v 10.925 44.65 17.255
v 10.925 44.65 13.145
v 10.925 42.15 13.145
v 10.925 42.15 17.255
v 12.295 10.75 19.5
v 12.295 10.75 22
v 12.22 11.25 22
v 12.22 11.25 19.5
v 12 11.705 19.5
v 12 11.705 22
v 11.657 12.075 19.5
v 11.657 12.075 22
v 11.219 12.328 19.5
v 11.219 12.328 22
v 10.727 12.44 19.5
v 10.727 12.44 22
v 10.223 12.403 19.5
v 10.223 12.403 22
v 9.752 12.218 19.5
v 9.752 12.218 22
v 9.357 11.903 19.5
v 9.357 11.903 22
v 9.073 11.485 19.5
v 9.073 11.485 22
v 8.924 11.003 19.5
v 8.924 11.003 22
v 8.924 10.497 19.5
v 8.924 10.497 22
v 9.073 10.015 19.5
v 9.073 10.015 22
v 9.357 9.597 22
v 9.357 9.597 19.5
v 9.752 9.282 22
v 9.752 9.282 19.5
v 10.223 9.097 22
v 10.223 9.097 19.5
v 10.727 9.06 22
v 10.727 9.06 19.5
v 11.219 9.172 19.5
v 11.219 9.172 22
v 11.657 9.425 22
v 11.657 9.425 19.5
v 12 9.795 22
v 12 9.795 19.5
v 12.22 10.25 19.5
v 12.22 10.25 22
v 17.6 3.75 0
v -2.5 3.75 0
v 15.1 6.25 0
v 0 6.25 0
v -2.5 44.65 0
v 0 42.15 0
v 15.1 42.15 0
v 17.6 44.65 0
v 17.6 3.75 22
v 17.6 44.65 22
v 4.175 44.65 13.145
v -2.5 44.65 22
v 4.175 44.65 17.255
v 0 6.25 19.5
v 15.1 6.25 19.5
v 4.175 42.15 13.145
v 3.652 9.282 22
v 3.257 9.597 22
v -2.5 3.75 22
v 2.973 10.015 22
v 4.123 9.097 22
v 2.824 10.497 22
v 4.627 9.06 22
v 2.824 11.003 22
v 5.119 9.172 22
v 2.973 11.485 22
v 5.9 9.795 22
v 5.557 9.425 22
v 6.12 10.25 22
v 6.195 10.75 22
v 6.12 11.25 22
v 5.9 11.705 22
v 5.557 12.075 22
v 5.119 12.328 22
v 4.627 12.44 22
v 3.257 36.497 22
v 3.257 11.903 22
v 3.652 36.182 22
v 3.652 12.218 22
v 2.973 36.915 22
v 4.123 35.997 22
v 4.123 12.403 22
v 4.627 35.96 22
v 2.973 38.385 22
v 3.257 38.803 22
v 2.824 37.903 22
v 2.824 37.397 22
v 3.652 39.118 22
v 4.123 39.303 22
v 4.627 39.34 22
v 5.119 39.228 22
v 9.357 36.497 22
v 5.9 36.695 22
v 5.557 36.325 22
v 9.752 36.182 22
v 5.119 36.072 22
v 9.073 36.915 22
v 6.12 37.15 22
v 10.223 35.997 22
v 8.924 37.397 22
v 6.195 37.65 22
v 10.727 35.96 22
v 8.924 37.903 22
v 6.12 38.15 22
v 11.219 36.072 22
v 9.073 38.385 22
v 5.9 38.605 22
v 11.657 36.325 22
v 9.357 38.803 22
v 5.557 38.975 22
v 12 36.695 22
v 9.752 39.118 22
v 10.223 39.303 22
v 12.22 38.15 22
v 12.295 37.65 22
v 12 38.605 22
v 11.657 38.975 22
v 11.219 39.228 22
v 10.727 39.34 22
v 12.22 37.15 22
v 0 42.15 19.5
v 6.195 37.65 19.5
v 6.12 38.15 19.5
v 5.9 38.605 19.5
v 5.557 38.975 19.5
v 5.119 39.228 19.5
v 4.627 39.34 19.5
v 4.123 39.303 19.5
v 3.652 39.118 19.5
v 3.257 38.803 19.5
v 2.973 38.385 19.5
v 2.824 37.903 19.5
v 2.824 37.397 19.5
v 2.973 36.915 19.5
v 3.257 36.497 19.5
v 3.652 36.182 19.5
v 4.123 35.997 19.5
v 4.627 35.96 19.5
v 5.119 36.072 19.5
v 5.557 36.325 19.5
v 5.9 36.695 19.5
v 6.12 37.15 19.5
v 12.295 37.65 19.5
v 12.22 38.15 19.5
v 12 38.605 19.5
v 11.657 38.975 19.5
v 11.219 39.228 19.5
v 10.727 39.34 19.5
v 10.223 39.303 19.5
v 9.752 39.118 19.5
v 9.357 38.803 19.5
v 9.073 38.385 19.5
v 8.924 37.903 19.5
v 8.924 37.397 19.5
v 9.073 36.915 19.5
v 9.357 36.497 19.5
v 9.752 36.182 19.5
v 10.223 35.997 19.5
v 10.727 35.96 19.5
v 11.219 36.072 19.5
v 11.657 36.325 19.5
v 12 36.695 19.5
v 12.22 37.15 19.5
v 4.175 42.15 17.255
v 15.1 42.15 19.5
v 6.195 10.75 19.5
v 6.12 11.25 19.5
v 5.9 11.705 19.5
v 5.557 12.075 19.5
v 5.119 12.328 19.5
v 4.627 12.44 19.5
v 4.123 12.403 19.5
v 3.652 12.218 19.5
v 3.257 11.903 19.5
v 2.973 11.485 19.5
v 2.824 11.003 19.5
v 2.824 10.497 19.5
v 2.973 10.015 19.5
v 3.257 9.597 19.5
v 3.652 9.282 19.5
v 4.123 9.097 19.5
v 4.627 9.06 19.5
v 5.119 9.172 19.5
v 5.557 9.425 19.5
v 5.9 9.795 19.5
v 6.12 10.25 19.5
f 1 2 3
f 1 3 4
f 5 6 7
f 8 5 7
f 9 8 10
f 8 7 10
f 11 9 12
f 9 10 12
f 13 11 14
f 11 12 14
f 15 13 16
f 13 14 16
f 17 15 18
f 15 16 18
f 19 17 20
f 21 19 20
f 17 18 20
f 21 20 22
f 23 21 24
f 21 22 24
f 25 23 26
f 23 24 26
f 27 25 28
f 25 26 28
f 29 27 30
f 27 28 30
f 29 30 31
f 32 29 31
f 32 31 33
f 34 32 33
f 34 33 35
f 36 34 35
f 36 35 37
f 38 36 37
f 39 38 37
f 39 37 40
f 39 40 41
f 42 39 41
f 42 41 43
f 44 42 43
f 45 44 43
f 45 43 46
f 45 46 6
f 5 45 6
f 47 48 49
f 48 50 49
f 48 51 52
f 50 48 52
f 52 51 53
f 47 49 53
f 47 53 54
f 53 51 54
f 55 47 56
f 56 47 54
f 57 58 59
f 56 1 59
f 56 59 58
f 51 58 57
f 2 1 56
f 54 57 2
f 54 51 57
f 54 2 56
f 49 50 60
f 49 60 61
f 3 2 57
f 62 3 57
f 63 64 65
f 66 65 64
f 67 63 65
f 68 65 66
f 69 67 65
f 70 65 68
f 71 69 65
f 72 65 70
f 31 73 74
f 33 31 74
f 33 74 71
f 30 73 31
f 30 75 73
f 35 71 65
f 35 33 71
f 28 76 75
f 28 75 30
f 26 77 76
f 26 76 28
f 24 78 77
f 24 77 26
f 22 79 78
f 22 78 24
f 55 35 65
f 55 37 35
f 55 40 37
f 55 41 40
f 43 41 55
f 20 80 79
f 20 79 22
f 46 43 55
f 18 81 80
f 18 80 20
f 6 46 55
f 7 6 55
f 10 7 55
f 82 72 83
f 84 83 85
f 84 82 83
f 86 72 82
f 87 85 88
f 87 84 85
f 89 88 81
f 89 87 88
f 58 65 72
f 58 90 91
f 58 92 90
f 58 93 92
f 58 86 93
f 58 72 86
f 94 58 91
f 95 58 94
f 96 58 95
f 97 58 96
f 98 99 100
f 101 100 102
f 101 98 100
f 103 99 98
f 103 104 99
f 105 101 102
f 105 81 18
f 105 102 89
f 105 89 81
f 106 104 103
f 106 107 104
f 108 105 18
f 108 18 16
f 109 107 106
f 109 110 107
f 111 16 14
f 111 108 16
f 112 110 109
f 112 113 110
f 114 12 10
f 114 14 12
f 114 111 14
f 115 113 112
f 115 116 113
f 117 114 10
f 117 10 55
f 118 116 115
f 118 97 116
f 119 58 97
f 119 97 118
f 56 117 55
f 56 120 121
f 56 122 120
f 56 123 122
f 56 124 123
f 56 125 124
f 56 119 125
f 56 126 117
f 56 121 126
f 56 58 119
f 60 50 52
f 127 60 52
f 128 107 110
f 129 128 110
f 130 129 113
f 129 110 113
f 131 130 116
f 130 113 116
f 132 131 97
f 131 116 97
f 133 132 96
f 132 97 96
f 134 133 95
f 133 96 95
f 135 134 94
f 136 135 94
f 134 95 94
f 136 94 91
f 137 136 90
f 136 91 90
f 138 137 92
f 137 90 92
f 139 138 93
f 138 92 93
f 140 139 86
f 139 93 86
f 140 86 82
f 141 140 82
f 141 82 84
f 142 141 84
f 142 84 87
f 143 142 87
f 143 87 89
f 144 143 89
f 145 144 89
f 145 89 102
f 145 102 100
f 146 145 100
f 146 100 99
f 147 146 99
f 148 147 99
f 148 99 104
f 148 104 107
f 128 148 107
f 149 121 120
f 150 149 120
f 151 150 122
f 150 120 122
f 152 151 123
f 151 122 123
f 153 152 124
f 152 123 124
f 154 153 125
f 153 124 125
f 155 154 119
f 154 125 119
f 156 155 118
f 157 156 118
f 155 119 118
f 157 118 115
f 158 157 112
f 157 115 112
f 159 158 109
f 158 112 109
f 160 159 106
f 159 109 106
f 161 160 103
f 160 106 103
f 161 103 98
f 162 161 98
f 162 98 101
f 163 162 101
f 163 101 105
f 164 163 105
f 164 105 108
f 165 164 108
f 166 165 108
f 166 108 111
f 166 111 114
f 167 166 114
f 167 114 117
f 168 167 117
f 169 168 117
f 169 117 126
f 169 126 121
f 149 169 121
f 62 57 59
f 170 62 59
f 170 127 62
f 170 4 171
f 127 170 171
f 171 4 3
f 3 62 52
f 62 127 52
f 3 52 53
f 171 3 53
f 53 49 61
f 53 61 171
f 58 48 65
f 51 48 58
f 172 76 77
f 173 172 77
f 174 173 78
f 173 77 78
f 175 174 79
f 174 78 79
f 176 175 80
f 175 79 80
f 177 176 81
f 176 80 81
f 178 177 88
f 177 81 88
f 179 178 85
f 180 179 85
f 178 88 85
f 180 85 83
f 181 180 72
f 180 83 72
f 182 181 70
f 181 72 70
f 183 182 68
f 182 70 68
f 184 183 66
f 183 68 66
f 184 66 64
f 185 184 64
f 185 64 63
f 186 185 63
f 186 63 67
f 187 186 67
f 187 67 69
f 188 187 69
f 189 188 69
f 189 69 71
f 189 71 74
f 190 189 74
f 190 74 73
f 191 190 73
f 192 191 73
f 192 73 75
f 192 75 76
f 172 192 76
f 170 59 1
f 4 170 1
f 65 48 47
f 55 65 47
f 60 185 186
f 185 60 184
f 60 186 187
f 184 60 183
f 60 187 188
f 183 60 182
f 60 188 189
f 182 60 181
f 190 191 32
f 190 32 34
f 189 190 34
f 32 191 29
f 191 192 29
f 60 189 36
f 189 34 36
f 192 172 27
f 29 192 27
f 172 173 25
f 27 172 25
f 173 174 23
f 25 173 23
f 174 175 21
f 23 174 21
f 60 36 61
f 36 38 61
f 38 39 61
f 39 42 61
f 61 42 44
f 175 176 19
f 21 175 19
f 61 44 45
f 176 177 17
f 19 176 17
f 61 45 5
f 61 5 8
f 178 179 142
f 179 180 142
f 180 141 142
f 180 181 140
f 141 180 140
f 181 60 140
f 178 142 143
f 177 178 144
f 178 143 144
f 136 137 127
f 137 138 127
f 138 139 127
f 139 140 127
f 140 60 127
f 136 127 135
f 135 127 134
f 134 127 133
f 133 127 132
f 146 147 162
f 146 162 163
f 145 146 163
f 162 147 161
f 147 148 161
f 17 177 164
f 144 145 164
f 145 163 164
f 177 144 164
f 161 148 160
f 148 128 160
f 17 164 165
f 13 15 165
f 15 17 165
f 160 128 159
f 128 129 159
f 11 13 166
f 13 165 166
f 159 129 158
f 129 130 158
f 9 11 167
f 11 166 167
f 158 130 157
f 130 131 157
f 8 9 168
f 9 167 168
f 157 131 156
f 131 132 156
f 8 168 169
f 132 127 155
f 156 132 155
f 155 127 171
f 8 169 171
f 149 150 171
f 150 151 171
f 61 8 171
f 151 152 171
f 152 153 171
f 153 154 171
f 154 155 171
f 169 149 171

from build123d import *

# Parameters (mm, degrees)
F0_W     = 20.1
F0_H     = 40.9
F0_W_2   = 15.1
F0_H_2   = 35.9
F1_DEPTH = 22
F2_DEPTH = 19.5
F4_R     = 1.695
F5_DEPTH = 25
F7_W     = 3.375
F7_H     = 4.11
F8_DEPTH = 25


with BuildPart() as f1:
    # F0 (on Top) → F1 (new body)
    with BuildSketch(Plane.XY):
        with Locations((7.55, 24.2)):
            Rectangle(F0_W, F0_H)
        with Locations((7.55, 24.2)):
            Rectangle(F0_W_2, F0_H_2, mode=Mode.SUBTRACT)
        with Locations((7.55, 24.2)):
            Rectangle(F0_W_2, F0_H_2)
    extrude(amount=F1_DEPTH)

    # F0 (on Top) → F2 (cut)
    with BuildSketch(Plane.XY):
        with Locations((7.55, 24.2)):
            Rectangle(F0_W_2, F0_H_2)
    extrude(amount=F2_DEPTH, mode=Mode.SUBTRACT)

    # F4 (on offset) → F5 (cut)
    with BuildSketch(Plane.XY.offset(22)):
        with Locations((4.5, 37.65)):
            Circle(F4_R)
        with Locations((10.6, 37.65)):
            Circle(F4_R)
        with Locations((4.5, 10.75)):
            Circle(F4_R)
        with Locations((10.6, 10.75)):
            Circle(F4_R)
    extrude(amount=-F5_DEPTH, mode=Mode.SUBTRACT)

    # F7 (on offset) → F8 (cut)
    with BuildSketch(Plane(origin=(0, 44.65, 0), x_dir=(-1, 0, 0), z_dir=(0, 1, 0))):
        with Locations((-5.8625, 15.2)):
            Rectangle(F7_W, F7_H)
        with Locations((-9.2375, 15.2)):
            Rectangle(F7_W, F7_H)
    extrude(amount=-F8_DEPTH, mode=Mode.SUBTRACT)


solid = f1.part
